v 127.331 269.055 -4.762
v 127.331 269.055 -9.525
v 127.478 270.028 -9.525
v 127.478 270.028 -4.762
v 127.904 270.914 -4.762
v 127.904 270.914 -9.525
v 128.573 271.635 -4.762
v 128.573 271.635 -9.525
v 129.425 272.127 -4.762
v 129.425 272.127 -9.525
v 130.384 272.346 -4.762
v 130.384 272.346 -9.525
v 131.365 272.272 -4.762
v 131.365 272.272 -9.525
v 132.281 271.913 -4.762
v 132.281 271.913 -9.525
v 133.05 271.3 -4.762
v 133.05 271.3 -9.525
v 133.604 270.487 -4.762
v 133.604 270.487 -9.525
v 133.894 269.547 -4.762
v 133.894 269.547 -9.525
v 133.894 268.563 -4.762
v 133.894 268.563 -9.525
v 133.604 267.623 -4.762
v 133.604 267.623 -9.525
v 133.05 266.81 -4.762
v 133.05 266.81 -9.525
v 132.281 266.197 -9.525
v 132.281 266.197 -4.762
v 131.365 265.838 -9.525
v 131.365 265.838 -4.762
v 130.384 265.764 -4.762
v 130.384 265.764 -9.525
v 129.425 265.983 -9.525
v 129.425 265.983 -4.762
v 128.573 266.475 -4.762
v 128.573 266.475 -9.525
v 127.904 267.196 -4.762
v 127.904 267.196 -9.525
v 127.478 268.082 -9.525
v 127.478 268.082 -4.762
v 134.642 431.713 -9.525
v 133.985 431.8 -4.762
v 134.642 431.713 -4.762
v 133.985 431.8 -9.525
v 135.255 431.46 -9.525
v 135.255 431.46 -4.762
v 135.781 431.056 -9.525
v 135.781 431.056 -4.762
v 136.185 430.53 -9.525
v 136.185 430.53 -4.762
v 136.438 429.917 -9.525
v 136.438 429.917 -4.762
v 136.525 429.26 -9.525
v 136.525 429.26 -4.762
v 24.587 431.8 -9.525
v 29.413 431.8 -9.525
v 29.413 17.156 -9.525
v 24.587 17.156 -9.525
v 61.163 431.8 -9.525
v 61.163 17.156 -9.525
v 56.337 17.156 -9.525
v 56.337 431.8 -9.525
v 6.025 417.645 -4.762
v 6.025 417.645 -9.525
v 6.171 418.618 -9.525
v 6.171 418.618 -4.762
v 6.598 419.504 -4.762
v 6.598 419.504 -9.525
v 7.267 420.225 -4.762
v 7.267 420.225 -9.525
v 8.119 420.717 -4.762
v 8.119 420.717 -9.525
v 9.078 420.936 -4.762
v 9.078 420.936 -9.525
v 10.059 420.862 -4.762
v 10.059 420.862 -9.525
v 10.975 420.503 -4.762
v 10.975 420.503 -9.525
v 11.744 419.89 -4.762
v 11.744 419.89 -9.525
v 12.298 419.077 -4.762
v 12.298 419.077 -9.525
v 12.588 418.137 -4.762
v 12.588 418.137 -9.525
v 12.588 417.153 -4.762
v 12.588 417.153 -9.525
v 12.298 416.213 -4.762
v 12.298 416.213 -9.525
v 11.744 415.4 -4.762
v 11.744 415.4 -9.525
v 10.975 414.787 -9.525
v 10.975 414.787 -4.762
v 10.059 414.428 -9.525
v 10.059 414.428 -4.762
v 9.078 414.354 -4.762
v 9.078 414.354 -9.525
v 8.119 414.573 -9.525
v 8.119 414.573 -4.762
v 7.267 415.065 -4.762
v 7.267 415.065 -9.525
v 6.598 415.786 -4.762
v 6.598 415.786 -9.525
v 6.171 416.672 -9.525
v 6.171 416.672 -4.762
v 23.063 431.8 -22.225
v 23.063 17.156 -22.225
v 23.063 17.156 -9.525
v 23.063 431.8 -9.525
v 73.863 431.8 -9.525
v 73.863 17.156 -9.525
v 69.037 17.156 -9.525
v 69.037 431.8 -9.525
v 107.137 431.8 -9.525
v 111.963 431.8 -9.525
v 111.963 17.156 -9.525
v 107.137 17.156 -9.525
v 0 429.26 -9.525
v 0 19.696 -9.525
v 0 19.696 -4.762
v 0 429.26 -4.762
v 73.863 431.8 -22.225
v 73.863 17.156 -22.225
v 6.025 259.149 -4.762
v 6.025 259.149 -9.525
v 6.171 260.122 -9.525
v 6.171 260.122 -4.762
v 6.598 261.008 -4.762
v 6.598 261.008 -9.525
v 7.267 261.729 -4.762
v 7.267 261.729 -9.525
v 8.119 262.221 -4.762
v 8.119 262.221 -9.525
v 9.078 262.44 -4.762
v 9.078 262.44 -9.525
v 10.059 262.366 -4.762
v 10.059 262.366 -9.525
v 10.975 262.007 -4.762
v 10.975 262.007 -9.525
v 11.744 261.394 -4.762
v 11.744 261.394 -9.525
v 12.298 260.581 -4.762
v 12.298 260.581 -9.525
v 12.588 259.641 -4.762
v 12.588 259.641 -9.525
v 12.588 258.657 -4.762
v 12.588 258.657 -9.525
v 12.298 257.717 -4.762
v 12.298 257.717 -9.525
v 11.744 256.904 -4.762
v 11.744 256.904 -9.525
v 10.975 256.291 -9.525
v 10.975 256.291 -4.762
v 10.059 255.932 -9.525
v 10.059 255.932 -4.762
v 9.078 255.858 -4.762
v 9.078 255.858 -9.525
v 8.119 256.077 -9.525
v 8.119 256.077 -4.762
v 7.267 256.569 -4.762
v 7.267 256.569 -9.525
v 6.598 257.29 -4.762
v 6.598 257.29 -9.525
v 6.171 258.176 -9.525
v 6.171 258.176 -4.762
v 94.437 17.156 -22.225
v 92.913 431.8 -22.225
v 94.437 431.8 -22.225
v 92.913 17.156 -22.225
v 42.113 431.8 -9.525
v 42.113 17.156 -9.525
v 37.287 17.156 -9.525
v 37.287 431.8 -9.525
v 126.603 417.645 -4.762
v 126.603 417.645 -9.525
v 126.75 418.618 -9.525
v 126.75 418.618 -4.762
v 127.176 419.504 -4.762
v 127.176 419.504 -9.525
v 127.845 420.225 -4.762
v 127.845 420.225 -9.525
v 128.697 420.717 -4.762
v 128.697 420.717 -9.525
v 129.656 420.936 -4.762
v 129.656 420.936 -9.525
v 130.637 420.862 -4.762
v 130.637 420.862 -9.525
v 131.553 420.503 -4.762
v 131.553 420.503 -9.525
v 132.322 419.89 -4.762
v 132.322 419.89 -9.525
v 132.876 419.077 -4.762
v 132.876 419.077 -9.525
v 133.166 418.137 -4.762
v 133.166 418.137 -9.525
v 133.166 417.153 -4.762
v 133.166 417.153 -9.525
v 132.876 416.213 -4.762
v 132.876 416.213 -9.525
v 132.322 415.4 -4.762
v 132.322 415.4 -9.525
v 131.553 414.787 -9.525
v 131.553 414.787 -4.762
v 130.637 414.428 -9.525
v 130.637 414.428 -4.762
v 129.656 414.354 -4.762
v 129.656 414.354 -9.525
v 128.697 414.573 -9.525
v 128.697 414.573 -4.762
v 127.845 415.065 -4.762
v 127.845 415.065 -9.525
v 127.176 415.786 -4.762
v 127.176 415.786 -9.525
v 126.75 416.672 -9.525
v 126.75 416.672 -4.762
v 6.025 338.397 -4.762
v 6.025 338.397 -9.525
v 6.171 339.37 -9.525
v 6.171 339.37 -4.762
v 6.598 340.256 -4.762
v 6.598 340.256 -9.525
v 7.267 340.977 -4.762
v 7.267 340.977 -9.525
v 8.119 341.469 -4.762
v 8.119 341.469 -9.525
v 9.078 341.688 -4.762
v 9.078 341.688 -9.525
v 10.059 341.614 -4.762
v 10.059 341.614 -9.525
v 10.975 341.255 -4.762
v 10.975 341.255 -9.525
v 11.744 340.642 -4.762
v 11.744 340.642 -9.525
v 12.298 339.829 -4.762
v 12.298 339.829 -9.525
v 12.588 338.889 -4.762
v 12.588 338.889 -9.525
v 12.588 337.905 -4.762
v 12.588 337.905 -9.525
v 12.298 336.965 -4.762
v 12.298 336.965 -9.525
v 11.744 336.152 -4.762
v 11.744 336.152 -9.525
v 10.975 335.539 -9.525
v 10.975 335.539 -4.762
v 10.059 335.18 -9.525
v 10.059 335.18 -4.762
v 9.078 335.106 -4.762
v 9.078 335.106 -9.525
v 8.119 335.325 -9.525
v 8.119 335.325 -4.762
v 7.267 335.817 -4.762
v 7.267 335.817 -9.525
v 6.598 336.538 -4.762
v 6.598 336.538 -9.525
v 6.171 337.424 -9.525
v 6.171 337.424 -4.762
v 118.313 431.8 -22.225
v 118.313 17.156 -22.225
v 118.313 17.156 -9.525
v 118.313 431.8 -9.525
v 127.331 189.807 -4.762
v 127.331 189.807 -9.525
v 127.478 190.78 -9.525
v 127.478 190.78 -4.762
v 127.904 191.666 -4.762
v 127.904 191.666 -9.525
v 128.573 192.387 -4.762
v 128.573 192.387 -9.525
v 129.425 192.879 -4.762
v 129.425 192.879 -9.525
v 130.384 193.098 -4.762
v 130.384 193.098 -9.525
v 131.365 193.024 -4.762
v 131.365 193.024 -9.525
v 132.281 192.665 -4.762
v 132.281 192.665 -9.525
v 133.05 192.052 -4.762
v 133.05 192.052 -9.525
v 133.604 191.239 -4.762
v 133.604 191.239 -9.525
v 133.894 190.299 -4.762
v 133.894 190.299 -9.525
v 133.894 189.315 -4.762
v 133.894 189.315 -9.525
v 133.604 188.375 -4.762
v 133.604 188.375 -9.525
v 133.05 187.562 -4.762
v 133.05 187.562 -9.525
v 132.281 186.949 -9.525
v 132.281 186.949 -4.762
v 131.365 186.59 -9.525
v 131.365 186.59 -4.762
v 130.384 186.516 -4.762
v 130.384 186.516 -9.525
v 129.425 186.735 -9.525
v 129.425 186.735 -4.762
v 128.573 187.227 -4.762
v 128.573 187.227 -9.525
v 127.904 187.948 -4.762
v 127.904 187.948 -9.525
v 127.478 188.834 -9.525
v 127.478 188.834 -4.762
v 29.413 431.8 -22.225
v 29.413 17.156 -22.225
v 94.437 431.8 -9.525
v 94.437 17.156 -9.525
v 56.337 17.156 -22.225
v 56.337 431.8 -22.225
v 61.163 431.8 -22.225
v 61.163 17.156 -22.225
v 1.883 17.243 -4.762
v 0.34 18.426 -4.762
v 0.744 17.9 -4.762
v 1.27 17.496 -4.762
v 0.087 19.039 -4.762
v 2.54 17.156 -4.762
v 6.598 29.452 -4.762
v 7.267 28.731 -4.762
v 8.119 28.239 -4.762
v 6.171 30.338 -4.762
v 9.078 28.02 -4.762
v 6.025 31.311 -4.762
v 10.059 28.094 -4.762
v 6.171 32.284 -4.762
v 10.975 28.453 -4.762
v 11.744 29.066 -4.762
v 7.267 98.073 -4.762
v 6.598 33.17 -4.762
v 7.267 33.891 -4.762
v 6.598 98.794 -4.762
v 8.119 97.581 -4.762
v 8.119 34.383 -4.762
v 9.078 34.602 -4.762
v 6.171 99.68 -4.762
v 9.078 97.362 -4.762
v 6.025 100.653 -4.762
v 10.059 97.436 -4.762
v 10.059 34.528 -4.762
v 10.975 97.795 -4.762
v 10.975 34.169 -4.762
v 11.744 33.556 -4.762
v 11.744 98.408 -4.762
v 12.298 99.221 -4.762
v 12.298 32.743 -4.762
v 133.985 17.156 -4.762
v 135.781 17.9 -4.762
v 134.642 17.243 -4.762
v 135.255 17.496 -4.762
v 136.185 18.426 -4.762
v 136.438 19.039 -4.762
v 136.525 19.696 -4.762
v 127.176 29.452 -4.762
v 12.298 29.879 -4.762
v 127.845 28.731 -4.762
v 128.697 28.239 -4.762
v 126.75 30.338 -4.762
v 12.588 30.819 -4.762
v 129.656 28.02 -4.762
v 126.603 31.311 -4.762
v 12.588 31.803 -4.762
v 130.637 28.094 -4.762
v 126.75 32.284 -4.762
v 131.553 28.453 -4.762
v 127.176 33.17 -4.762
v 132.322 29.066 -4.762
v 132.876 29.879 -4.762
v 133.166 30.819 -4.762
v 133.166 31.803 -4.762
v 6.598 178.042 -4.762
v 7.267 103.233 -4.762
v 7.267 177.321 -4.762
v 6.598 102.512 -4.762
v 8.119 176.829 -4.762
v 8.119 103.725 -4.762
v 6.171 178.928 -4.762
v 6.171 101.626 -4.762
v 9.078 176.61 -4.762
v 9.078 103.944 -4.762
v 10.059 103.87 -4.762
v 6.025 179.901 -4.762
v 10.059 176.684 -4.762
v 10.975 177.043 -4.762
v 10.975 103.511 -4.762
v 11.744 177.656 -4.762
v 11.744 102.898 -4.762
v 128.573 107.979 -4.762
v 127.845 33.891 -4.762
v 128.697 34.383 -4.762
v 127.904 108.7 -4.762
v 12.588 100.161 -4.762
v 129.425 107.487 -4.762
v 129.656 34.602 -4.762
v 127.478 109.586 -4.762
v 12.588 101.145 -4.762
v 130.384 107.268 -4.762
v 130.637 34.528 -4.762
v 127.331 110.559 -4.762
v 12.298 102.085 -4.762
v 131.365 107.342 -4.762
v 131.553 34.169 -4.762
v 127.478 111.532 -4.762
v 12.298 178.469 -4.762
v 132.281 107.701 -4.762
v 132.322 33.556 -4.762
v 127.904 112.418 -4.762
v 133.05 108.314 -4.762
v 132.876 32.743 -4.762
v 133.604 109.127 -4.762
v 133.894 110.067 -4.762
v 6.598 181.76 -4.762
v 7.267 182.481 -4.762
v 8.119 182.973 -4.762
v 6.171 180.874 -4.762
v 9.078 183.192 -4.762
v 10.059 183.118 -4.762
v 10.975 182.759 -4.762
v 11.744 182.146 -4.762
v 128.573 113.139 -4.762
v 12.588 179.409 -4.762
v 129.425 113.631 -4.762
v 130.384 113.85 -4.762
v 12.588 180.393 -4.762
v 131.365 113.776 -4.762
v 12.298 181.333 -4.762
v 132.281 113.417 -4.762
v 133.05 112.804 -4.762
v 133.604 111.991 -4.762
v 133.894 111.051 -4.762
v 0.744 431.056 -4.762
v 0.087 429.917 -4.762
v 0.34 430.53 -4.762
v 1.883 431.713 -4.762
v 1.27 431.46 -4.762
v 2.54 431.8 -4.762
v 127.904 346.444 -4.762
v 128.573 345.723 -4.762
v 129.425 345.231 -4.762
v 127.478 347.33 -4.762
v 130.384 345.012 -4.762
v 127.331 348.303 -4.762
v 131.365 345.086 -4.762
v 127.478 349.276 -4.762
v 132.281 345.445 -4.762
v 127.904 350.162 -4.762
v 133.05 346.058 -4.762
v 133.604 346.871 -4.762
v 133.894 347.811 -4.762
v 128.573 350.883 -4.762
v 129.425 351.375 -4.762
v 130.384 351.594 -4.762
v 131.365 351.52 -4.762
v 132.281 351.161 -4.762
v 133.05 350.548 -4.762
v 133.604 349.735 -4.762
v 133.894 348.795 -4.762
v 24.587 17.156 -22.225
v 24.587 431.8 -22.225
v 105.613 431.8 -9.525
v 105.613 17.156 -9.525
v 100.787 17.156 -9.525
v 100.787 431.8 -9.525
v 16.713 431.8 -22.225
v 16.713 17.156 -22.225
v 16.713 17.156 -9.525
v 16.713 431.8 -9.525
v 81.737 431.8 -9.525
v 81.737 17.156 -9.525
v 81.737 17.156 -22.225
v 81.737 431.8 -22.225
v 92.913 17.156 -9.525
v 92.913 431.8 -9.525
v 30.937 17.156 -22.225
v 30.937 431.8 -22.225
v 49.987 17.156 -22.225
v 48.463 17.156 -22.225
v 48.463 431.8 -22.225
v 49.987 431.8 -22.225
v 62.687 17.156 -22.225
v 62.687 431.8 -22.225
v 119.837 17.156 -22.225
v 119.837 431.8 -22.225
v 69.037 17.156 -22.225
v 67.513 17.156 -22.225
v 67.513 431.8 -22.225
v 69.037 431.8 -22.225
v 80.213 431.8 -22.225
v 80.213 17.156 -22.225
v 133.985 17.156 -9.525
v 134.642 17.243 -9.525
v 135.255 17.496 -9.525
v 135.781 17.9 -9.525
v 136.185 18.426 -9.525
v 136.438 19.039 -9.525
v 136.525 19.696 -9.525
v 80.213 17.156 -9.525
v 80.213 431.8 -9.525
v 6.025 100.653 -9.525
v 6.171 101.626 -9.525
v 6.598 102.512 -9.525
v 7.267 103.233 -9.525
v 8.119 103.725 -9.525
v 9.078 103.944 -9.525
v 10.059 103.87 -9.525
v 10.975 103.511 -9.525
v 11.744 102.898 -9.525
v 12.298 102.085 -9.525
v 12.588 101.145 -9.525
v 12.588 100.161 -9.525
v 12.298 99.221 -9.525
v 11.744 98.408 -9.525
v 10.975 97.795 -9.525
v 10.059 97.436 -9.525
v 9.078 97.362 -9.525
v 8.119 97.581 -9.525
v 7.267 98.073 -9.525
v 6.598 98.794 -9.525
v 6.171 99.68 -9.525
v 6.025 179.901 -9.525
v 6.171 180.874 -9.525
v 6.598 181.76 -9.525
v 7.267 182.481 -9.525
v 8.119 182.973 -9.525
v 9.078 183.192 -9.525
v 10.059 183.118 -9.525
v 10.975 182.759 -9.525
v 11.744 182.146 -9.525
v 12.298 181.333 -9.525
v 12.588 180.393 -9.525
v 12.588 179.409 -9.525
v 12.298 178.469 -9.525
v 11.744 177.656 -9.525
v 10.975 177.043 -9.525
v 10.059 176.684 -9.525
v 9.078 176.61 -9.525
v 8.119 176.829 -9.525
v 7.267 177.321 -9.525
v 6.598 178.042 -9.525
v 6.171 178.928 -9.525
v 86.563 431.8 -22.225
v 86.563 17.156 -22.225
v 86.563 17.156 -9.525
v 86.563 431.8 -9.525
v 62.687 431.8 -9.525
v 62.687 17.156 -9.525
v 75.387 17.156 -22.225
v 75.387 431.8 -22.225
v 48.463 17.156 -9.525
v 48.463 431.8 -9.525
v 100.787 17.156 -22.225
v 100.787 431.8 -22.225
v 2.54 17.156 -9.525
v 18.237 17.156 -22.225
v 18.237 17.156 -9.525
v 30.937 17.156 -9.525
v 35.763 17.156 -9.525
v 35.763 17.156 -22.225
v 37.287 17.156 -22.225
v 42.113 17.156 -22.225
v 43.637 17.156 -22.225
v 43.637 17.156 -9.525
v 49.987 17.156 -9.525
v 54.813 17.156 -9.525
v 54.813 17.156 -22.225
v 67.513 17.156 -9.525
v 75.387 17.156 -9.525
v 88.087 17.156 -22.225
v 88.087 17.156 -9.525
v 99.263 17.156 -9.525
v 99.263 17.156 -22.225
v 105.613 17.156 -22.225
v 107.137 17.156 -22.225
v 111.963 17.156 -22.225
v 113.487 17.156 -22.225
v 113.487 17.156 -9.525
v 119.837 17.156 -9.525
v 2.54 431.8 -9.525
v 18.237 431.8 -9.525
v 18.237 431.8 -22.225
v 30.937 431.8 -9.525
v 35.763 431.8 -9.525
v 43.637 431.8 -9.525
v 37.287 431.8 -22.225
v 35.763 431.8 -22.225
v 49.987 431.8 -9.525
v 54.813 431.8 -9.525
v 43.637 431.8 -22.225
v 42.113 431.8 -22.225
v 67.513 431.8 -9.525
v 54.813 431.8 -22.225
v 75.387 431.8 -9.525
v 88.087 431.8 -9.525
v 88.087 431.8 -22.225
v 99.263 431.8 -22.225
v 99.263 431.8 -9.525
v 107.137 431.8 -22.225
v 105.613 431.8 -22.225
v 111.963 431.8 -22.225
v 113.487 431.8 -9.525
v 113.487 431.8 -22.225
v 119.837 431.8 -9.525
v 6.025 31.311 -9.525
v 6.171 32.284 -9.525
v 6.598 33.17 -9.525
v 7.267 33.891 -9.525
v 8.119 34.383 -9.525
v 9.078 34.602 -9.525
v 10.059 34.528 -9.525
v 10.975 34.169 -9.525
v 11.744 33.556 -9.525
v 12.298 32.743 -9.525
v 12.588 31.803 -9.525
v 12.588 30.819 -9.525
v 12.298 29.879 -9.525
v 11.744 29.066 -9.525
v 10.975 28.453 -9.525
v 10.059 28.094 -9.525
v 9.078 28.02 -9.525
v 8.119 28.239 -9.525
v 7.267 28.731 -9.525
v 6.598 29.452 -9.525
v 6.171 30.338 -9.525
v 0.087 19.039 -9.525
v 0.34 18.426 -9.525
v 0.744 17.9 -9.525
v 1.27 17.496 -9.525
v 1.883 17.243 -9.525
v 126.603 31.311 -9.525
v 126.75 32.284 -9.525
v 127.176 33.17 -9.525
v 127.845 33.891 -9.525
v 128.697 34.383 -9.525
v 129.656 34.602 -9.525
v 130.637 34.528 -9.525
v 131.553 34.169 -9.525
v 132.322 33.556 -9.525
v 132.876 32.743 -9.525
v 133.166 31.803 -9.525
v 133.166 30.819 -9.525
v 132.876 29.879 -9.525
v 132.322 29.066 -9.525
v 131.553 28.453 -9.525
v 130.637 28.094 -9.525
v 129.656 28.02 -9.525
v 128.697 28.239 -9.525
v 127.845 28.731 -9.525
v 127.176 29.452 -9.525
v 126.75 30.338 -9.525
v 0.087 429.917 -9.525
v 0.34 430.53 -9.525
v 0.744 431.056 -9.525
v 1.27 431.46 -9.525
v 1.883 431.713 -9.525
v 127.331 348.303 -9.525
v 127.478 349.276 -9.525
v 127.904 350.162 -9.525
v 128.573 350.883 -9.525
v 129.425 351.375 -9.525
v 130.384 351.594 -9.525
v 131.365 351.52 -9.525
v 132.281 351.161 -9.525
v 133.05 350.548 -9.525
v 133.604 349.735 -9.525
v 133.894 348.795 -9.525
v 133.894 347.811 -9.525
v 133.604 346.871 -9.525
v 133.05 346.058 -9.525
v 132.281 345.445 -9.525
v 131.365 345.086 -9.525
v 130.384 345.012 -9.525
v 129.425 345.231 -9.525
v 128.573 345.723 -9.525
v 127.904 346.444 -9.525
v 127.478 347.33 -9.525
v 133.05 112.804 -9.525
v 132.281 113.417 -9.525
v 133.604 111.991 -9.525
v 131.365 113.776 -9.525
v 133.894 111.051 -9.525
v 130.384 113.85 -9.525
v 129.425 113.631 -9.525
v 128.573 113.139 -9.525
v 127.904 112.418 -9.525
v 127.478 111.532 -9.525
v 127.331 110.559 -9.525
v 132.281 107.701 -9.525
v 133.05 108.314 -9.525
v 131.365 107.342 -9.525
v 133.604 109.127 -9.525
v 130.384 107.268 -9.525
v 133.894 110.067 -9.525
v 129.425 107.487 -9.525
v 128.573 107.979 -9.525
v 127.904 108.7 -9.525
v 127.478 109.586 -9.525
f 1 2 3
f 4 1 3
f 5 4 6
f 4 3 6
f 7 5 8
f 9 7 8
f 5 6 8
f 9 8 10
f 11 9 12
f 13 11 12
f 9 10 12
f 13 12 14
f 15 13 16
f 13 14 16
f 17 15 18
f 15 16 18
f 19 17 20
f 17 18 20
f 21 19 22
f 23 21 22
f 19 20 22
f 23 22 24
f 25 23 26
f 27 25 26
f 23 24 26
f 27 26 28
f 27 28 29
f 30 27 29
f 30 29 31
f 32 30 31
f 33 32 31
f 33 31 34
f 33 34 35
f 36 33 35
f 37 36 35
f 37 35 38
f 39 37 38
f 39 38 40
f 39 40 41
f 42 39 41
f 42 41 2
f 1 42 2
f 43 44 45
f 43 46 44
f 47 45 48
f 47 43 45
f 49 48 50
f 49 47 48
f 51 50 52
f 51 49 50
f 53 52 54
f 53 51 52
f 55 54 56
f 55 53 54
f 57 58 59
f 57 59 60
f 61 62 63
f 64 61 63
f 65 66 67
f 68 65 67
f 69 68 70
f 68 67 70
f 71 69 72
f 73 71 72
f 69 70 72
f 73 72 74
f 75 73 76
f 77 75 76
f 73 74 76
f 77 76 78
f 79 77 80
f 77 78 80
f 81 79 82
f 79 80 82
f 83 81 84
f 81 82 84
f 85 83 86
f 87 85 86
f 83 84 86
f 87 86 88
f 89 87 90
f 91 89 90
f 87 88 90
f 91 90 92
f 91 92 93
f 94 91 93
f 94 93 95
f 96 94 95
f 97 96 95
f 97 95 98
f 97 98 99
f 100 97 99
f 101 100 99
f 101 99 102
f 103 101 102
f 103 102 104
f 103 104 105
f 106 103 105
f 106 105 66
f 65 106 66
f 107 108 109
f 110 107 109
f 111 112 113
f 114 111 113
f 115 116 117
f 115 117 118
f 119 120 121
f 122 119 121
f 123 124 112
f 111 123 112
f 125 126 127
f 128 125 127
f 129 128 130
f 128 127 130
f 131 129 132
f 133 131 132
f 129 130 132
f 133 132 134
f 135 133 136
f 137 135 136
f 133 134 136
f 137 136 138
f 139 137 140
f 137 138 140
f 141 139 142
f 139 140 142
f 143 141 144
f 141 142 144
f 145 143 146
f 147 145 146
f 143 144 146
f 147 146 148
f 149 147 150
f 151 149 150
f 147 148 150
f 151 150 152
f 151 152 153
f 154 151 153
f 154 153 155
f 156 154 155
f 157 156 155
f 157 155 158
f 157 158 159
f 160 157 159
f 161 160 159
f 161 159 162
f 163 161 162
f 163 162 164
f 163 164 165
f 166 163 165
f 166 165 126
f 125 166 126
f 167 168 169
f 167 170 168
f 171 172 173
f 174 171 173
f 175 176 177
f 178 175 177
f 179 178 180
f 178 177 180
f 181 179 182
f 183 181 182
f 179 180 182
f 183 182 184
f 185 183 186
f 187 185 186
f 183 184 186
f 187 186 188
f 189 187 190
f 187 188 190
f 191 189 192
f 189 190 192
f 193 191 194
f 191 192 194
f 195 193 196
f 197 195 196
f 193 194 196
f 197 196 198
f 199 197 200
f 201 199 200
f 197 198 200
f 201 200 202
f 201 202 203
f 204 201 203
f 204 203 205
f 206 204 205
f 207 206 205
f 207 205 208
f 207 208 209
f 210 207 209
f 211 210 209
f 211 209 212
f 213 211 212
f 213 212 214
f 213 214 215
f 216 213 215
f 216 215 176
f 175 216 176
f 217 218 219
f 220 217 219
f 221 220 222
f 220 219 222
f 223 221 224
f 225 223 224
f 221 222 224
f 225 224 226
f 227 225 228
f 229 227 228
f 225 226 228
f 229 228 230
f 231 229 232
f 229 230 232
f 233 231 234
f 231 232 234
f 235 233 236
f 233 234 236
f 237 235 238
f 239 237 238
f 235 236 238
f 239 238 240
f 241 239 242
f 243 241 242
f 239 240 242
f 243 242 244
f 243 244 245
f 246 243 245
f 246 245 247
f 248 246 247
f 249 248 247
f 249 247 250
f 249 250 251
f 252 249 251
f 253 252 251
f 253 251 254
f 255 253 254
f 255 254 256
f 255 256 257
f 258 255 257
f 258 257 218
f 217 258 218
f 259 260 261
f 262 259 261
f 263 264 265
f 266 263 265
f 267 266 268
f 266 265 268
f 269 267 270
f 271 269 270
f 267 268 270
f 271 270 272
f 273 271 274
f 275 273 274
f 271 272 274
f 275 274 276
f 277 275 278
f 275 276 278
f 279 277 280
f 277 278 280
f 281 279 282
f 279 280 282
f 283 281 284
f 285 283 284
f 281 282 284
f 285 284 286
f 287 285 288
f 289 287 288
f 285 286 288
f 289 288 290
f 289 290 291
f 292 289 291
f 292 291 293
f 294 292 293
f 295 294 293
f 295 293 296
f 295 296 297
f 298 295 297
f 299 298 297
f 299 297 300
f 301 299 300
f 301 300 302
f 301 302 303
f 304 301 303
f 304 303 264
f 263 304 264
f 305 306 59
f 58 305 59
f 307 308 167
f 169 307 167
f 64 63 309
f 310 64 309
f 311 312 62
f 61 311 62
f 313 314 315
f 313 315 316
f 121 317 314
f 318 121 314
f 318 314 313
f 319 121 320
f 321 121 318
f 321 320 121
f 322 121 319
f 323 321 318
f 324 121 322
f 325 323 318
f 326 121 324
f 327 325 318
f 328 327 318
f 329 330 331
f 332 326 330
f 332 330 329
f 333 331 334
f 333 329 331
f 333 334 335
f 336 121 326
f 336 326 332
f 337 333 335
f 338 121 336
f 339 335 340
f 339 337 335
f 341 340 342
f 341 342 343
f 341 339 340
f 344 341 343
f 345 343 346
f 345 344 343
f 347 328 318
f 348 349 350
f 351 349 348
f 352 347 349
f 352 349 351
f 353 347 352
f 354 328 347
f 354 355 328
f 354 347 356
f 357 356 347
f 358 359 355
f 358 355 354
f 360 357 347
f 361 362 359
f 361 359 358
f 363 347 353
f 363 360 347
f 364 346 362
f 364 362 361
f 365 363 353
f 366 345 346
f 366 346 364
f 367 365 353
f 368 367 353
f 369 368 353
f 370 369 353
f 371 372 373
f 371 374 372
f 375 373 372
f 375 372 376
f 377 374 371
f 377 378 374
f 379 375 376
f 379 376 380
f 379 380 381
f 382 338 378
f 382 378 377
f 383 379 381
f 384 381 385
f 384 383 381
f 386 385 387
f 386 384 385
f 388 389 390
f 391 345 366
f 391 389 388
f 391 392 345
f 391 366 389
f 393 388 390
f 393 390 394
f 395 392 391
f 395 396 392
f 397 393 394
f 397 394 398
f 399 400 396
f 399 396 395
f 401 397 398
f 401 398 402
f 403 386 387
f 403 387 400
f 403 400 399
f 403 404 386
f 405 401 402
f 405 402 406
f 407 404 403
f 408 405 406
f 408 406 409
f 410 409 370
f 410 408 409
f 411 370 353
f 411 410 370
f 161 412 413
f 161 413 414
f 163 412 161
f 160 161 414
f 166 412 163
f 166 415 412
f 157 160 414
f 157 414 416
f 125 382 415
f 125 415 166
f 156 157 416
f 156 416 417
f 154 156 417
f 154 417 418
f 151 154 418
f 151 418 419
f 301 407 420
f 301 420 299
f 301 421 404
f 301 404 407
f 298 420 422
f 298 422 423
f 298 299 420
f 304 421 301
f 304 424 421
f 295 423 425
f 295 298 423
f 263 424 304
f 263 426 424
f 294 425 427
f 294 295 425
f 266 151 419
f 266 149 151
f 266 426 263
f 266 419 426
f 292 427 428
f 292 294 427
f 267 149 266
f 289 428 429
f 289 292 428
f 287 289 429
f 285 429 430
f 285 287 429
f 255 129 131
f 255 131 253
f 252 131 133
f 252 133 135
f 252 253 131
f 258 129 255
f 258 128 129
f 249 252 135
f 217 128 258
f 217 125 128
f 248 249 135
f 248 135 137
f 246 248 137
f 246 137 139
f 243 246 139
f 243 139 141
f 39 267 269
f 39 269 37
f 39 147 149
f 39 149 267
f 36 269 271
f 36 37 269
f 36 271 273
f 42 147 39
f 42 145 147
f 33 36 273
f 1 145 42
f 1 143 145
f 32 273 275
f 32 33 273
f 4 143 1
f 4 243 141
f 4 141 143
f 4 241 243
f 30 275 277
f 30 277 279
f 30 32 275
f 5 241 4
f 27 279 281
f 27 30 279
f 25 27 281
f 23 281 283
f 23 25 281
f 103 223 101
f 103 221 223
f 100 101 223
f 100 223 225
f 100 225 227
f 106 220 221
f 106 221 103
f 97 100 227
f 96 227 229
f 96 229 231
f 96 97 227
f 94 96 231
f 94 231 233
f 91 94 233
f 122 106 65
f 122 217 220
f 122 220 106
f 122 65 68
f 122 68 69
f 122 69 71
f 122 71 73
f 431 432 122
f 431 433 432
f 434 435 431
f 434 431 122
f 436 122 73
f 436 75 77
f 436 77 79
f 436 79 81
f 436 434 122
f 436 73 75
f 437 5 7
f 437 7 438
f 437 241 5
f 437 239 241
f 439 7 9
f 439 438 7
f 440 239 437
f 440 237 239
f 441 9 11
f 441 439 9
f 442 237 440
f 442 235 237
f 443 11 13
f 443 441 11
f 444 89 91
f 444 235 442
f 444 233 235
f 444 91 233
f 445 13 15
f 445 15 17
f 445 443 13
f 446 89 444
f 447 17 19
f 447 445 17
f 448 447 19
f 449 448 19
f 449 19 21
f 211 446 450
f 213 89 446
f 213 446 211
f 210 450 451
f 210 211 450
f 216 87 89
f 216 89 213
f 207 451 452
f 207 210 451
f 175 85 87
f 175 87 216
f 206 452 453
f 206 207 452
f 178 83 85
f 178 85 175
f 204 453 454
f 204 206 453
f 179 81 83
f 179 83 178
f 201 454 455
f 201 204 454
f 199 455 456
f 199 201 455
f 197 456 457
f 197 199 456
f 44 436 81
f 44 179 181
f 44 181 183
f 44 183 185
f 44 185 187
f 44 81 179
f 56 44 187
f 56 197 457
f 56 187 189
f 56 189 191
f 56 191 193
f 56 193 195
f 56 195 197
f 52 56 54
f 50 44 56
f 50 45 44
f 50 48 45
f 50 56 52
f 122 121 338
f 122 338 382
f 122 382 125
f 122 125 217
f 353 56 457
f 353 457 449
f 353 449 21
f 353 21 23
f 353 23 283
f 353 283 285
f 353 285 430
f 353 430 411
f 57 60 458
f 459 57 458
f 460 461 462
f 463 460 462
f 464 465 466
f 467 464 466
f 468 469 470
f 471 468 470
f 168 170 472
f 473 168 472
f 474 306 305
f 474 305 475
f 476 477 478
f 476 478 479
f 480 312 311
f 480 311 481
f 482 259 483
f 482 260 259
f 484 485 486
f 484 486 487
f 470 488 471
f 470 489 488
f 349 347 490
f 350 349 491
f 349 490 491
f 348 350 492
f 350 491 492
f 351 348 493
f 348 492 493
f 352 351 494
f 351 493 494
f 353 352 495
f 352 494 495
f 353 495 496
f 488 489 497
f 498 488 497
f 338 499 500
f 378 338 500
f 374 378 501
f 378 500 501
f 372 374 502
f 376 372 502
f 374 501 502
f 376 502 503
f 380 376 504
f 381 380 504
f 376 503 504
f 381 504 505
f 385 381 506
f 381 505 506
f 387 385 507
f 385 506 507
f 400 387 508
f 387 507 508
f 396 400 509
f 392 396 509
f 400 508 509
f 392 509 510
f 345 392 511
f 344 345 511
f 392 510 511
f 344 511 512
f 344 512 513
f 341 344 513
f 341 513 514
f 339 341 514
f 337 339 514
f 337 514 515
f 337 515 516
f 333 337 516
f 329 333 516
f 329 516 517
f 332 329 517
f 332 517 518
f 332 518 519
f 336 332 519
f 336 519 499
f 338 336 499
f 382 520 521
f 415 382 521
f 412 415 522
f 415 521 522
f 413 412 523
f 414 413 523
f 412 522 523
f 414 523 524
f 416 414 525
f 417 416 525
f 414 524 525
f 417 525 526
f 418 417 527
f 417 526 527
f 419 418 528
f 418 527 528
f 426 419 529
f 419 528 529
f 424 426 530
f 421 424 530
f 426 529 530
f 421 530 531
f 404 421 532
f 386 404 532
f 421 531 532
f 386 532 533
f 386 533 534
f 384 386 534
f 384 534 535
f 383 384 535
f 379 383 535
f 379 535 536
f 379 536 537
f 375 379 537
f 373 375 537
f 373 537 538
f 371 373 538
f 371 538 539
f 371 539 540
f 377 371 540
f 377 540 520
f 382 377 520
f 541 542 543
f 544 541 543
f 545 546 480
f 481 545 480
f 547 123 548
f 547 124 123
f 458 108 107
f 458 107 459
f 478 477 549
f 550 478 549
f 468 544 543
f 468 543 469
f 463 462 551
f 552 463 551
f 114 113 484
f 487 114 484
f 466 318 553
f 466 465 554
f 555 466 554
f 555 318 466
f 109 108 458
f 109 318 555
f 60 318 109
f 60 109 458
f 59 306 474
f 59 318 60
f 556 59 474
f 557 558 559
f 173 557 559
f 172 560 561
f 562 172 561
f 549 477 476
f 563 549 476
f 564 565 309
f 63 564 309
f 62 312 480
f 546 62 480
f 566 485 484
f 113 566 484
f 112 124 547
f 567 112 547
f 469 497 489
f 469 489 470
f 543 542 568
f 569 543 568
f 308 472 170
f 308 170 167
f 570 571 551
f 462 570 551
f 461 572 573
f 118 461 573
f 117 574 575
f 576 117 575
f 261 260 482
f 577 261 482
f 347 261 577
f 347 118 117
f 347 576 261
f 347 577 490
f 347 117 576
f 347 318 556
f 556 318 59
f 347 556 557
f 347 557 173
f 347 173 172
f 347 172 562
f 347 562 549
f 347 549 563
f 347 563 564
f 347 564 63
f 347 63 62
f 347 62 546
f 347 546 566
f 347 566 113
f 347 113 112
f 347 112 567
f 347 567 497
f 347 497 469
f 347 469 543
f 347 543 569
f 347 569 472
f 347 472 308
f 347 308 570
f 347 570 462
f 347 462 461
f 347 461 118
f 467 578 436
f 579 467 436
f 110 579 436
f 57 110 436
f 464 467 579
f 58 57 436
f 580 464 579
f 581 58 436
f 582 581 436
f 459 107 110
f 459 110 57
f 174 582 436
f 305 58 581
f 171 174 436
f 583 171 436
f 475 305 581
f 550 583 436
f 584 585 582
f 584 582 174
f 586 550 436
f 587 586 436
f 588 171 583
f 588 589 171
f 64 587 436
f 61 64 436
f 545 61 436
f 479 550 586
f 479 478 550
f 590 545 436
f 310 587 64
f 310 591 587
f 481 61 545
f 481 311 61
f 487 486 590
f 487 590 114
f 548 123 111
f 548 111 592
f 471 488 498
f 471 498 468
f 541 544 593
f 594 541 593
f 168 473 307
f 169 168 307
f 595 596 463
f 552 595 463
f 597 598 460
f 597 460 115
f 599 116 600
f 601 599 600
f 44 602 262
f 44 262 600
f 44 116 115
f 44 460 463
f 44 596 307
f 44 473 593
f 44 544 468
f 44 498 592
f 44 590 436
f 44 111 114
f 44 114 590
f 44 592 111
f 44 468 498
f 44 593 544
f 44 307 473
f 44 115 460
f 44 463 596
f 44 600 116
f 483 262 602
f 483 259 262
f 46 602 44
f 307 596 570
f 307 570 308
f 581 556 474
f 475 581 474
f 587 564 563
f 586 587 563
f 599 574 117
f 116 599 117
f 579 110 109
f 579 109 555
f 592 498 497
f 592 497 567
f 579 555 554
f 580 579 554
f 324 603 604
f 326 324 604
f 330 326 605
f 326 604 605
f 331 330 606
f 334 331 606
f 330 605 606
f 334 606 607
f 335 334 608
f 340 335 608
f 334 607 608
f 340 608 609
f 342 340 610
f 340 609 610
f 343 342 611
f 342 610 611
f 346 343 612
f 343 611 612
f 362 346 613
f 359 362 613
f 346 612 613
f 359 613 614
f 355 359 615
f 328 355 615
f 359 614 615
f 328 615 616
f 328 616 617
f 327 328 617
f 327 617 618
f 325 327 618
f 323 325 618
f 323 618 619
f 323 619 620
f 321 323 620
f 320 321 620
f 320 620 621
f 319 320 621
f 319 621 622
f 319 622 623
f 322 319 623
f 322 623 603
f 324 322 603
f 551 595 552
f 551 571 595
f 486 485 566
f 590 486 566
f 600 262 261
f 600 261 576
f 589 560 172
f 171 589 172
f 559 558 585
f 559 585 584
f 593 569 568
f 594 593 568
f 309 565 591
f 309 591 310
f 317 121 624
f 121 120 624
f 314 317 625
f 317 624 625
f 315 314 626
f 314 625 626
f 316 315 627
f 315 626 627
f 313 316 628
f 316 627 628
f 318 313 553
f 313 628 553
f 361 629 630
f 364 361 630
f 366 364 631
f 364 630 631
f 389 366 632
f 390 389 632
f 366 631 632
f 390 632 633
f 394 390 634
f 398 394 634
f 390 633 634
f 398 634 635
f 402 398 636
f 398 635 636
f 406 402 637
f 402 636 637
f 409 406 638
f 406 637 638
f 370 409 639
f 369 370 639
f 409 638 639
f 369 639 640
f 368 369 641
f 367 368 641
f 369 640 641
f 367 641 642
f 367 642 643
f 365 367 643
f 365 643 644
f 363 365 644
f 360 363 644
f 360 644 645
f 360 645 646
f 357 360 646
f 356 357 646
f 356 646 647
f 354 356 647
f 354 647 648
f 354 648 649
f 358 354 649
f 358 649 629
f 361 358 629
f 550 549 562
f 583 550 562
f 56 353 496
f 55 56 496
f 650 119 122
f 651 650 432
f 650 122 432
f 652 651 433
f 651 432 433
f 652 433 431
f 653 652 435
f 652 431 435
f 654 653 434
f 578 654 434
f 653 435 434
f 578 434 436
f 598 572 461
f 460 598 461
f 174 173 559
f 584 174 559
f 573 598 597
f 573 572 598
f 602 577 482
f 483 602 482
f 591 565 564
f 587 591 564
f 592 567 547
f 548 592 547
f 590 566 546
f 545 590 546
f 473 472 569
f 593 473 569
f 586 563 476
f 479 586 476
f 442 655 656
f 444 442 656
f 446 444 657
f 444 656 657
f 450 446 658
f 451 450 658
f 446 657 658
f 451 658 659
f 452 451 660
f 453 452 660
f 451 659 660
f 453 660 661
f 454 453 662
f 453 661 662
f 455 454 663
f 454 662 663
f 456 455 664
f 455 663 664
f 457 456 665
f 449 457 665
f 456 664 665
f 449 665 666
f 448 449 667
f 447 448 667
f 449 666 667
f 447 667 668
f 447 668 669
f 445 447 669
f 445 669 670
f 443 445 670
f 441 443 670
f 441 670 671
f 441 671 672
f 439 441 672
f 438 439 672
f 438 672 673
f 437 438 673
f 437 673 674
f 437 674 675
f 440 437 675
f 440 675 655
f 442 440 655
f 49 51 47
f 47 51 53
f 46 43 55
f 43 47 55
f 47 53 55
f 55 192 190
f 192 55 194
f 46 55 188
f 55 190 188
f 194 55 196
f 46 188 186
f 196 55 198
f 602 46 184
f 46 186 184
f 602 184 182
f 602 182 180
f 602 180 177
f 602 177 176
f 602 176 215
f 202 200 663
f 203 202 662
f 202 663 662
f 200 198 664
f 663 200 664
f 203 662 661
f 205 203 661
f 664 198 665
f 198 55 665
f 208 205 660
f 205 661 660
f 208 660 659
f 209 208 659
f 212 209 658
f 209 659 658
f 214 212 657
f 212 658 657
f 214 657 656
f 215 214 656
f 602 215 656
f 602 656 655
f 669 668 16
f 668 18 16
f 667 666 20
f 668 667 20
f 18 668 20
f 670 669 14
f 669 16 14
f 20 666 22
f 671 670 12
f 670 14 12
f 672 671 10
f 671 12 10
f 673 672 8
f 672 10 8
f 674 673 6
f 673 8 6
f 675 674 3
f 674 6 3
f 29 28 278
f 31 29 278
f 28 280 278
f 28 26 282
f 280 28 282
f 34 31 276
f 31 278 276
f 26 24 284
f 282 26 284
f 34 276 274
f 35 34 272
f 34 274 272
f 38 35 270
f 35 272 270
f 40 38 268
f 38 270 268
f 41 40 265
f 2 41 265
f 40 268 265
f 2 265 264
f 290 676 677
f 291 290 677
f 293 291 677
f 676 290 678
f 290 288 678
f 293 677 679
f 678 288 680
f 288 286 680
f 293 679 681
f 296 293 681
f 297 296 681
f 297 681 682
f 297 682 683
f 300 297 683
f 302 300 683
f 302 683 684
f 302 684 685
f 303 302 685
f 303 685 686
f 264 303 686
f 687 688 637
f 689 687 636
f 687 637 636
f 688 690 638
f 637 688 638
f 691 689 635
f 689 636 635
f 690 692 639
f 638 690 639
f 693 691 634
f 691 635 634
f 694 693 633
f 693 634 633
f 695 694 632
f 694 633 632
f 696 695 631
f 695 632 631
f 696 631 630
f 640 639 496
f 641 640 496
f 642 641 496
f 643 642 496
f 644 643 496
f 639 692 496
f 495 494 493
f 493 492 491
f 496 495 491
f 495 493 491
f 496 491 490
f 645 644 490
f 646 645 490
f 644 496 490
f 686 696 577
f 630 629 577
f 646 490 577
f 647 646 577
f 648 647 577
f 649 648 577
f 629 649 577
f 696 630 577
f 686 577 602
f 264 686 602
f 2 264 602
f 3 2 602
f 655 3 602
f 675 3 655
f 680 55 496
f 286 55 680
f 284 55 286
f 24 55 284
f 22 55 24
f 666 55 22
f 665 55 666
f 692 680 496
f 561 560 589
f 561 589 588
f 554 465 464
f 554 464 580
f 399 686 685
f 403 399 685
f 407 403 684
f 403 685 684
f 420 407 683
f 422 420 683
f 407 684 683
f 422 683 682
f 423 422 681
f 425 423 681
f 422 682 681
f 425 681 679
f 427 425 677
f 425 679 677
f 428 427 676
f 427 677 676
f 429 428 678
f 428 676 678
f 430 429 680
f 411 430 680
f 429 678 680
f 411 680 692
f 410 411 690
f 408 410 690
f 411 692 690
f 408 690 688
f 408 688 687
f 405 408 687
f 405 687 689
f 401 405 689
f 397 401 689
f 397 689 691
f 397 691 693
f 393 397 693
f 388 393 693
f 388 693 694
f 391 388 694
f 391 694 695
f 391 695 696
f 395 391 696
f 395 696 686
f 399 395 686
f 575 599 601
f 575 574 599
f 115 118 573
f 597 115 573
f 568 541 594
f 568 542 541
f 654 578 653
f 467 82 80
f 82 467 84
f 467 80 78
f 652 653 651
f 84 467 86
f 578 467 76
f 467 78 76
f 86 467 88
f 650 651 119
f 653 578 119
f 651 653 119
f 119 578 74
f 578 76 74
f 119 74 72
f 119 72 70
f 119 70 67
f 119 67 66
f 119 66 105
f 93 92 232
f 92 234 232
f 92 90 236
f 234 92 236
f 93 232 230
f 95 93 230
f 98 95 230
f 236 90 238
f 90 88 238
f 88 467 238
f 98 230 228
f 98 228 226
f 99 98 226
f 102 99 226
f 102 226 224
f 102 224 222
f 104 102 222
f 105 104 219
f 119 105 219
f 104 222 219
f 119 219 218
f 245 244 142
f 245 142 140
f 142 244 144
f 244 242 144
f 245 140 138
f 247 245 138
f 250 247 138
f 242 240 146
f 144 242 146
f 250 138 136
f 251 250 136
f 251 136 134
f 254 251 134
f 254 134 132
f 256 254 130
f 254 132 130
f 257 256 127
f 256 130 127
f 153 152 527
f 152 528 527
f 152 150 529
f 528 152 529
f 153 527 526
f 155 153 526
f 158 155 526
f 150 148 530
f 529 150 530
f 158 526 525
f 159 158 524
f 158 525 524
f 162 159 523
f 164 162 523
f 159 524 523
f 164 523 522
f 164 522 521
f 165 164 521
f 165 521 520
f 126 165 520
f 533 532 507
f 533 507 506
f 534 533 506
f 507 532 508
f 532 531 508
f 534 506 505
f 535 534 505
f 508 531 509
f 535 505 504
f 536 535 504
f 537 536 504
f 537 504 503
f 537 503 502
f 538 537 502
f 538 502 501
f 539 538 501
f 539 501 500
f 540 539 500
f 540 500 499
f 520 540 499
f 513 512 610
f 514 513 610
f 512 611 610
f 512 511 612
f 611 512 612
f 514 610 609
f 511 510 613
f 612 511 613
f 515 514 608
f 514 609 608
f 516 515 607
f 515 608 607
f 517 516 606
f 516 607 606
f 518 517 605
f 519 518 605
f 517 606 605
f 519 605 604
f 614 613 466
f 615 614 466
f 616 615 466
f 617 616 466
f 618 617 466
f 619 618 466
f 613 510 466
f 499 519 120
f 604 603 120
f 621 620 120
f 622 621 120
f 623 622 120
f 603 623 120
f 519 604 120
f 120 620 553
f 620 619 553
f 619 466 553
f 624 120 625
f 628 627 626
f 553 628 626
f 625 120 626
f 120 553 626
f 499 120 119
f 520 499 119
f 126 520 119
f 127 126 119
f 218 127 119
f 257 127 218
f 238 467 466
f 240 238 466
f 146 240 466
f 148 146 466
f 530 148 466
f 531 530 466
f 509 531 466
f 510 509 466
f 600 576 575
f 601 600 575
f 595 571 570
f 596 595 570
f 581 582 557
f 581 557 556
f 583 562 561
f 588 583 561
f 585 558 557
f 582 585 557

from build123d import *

# Parameters (mm, degrees)
BOSS_EXTRUDE1_DEPTH     = 431.8
SKETCH2_W               = 136.525
SKETCH2_H               = 4.7625
CUT_EXTRUDE1_DEPTH      = 455.272910918
SKETCH3_W               = 132.265960651
SKETCH3_H               = 13.462
CUT_EXTRUDE2_DEPTH      = 455.272910918
SKETCH4_W               = 11.600566843
SKETCH4_H               = 14.103653616
SKETCH4_W_2             = 12.2809
SKETCH4_H_2             = 14.918520238
CUT_EXTRUDE3_DEPTH      = 454.414011969
CUT_EXTRUDE4_DEPTH      = 454.047023636
CUT_EXTRUDE4_DEPTH_BACK = 454.047023636
SKETCH5_W               = 16.6878
SKETCH5_H               = 17.155999978
SKETCH5_W_2             = 119.8372
FILLET1_R               = 2.54
M6_CLEARANCE_HOLE2_D    = 6.6


with BuildPart() as part:
    # Sketch1 → Boss-Extrude1 (new body)
    with BuildSketch(Plane(origin=(0, 0, 0), x_dir=(1, 0, 0), z_dir=(0, 1, 0))):
        with BuildLine():
            Line((0, 0), (136.525, 0))
            Line((136.525, 0), (136.525, 9.525))
            Line((136.525, 9.525), (132.5372, 9.525))
            Line((132.5372, 9.525), (132.5372, 34.925))
            ThreePointArc((132.5372, 34.925), (131.7752, 35.687), (131.0132, 34.925))
            Line((131.0132, 34.925), (131.0132, 9.525))
            Line((131.0132, 9.525), (126.1872, 9.525))
            Line((126.1872, 9.525), (126.1872, 34.925))
            ThreePointArc((126.1872, 34.925), (125.4252, 35.687), (124.6632, 34.925))
            Line((124.6632, 34.925), (124.6632, 9.525))
            Line((124.6632, 9.525), (119.8372, 9.525))
            Line((119.8372, 9.525), (119.8372, 34.925))
            ThreePointArc((119.8372, 34.925), (119.0752, 35.687), (118.3132, 34.925))
            Line((118.3132, 34.925), (118.3132, 9.525))
            Line((118.3132, 9.525), (113.4872, 9.525))
            Line((113.4872, 9.525), (113.4872, 34.925))
            ThreePointArc((113.4872, 34.925), (112.7252, 35.687), (111.9632, 34.925))
            Line((111.9632, 34.925), (111.9632, 9.525))
            Line((111.9632, 9.525), (107.1372, 9.525))
            Line((107.1372, 9.525), (107.1372, 34.925))
            ThreePointArc((107.1372, 34.925), (106.3752, 35.687), (105.6132, 34.925))
            Line((105.6132, 34.925), (105.6132, 9.525))
            Line((105.6132, 9.525), (100.7872, 9.525))
            Line((100.7872, 9.525), (100.7872, 34.925))
            ThreePointArc((100.7872, 34.925), (100.0252, 35.687), (99.2632, 34.925))
            Line((99.2632, 34.925), (99.2632, 9.525))
            Line((99.2632, 9.525), (94.4372, 9.525))
            Line((94.4372, 9.525), (94.4372, 34.925))
            ThreePointArc((94.4372, 34.925), (93.6752, 35.687), (92.9132, 34.925))
            Line((92.9132, 34.925), (92.9132, 9.525))
            Line((92.9132, 9.525), (88.0872, 9.525))
            Line((88.0872, 9.525), (88.0872, 34.925))
            ThreePointArc((88.0872, 34.925), (87.3252, 35.687), (86.5632, 34.925))
            Line((86.5632, 34.925), (86.5632, 9.525))
            Line((86.5632, 9.525), (81.7372, 9.525))
            Line((81.7372, 9.525), (81.7372, 34.925))
            ThreePointArc((81.7372, 34.925), (80.9752, 35.687), (80.2132, 34.925))
            Line((80.2132, 34.925), (80.2132, 9.525))
            Line((80.2132, 9.525), (75.3872, 9.525))
            Line((75.3872, 9.525), (75.3872, 34.925))
            ThreePointArc((75.3872, 34.925), (74.6252, 35.687), (73.8632, 34.925))
            Line((73.8632, 34.925), (73.8632, 9.525))
            Line((73.8632, 9.525), (69.0372, 9.525))
            Line((69.0372, 9.525), (69.0372, 34.925))
            ThreePointArc((69.0372, 34.925), (68.2752, 35.687), (67.5132, 34.925))
            Line((67.5132, 34.925), (67.5132, 9.525))
            Line((67.5132, 9.525), (62.6872, 9.525))
            Line((62.6872, 9.525), (62.6872, 34.925))
            ThreePointArc((62.6872, 34.925), (61.9252, 35.687), (61.1632, 34.925))
            Line((61.1632, 34.925), (61.1632, 9.525))
            Line((61.1632, 9.525), (56.3372, 9.525))
            Line((56.3372, 9.525), (56.3372, 34.925))
            ThreePointArc((56.3372, 34.925), (55.5752, 35.687), (54.8132, 34.925))
            Line((54.8132, 34.925), (54.8132, 9.525))
            Line((54.8132, 9.525), (49.9872, 9.525))
            Line((49.9872, 9.525), (49.9872, 34.925))
            ThreePointArc((49.9872, 34.925), (49.2252, 35.687), (48.4632, 34.925))
            Line((48.4632, 34.925), (48.4632, 9.525))
            Line((48.4632, 9.525), (43.6372, 9.525))
            Line((43.6372, 9.525), (43.6372, 34.925))
            ThreePointArc((43.6372, 34.925), (42.8752, 35.687), (42.1132, 34.925))
            Line((42.1132, 34.925), (42.1132, 9.525))
            Line((42.1132, 9.525), (37.2872, 9.525))
            Line((37.2872, 9.525), (37.2872, 34.925))
            ThreePointArc((37.2872, 34.925), (36.5252, 35.687), (35.7632, 34.925))
            Line((35.7632, 34.925), (35.7632, 9.525))
            Line((35.7632, 9.525), (30.9372, 9.525))
            Line((30.9372, 9.525), (30.9372, 34.925))
            ThreePointArc((30.9372, 34.925), (30.1752, 35.687), (29.4132, 34.925))
            Line((29.4132, 34.925), (29.4132, 9.525))
            Line((29.4132, 9.525), (24.5872, 9.525))
            Line((24.5872, 9.525), (24.5872, 34.925))
            ThreePointArc((24.5872, 34.925), (23.8252, 35.687), (23.0632, 34.925))
            Line((23.0632, 34.925), (23.0632, 9.525))
            Line((23.0632, 9.525), (18.2372, 9.525))
            Line((18.2372, 9.525), (18.2372, 34.925))
            ThreePointArc((18.2372, 34.925), (17.4752, 35.687), (16.7132, 34.925))
            Line((16.7132, 34.925), (16.7132, 9.525))
            Line((16.7132, 9.525), (11.8872, 9.525))
            Line((11.8872, 9.525), (11.8872, 34.925))
            ThreePointArc((11.8872, 34.925), (11.1252, 35.687), (10.3632, 34.925))
            Line((10.3632, 34.925), (10.3632, 9.525))
            Line((10.3632, 9.525), (5.5372, 9.525))
            Line((5.5372, 9.525), (5.5372, 34.925))
            ThreePointArc((5.5372, 34.925), (4.7752, 35.687), (4.0132, 34.925))
            Line((4.0132, 34.925), (4.0132, 9.525))
            Line((4.0132, 9.525), (0, 9.525))
            Line((0, 9.525), (0, 0))
        make_face()
    extrude(amount=BOSS_EXTRUDE1_DEPTH)

    # Sketch2 → Cut-Extrude1 (cut, through all)
    with BuildSketch(Plane(origin=(0, 431.8, 0), x_dir=(1, 0, 0), z_dir=(0, 1, 0))):
        with Locations((68.2625, 2.38125)):
            Rectangle(SKETCH2_W, SKETCH2_H)
    extrude(amount=-CUT_EXTRUDE1_DEPTH, mode=Mode.SUBTRACT)

    # Sketch3 → Cut-Extrude2 (cut, through all)
    with BuildSketch(Plane.XZ):
        with Locations((69.2831702, -28.956)):
            Rectangle(SKETCH3_W, SKETCH3_H)
    extrude(amount=-CUT_EXTRUDE2_DEPTH, mode=Mode.SUBTRACT)

    # Sketch4 → Cut-Extrude3 (cut, through all)
    with BuildSketch(Plane(origin=(0, 431.8, 0), x_dir=(1, 0, 0), z_dir=(0, 1, 0))):
        with Locations((7.806883422, 16.576826808)):
            Rectangle(SKETCH4_W, SKETCH4_H)
        with Locations((128.39065, 16.984260119)):
            Rectangle(SKETCH4_W_2, SKETCH4_H_2)
    extrude(amount=-CUT_EXTRUDE3_DEPTH, mode=Mode.SUBTRACT)

    # Sketch5 → Cut-Extrude4 (cut, two sides: drawn at the far end of the back side and taken through both)
    with BuildSketch(Plane(origin=(0, 0, -9.525), x_dir=(-1, 0, 0), z_dir=(0, 0, -1)).offset(-CUT_EXTRUDE4_DEPTH_BACK)):
        with Locations((-128.1811, 8.577999989)):
            Rectangle(SKETCH5_W, SKETCH5_H)
        with Locations((-59.9186, 8.577999989)):
            Rectangle(SKETCH5_W_2, SKETCH5_H)
    extrude(amount=CUT_EXTRUDE4_DEPTH + CUT_EXTRUDE4_DEPTH_BACK, mode=Mode.SUBTRACT)

    # Fillet1
    fillet1_edges = [part.edges().sort_by_distance(p)[0] for p in [
        (136.525, 431.8, -7.14375),
        (0, 431.8, -7.14375),
        (0, 17.155999978, -7.14375),
        (136.525, 17.155999978, -7.14375),
    ]]
    fillet(fillet1_edges, radius=FILLET1_R)

    # M6 Clearance Hole2 (through all)
    with Locations(Plane.XY.offset(-4.7625)):
        with Locations((9.324759355, 31.310999989), (129.902965514, 31.310999989), (130.630936095, 110.558999989), (9.324759355, 100.652999989), (9.324759355, 179.900999989), (130.630936095, 189.806999989), (9.324759355, 259.148999989), (130.630936095, 269.054999989), (130.630936095, 348.302999989), (9.324759355, 338.396999989), (9.324759355, 417.644999989), (129.902965514, 417.644999989)):
            Hole(M6_CLEARANCE_HOLE2_D / 2)


solid = part.part
